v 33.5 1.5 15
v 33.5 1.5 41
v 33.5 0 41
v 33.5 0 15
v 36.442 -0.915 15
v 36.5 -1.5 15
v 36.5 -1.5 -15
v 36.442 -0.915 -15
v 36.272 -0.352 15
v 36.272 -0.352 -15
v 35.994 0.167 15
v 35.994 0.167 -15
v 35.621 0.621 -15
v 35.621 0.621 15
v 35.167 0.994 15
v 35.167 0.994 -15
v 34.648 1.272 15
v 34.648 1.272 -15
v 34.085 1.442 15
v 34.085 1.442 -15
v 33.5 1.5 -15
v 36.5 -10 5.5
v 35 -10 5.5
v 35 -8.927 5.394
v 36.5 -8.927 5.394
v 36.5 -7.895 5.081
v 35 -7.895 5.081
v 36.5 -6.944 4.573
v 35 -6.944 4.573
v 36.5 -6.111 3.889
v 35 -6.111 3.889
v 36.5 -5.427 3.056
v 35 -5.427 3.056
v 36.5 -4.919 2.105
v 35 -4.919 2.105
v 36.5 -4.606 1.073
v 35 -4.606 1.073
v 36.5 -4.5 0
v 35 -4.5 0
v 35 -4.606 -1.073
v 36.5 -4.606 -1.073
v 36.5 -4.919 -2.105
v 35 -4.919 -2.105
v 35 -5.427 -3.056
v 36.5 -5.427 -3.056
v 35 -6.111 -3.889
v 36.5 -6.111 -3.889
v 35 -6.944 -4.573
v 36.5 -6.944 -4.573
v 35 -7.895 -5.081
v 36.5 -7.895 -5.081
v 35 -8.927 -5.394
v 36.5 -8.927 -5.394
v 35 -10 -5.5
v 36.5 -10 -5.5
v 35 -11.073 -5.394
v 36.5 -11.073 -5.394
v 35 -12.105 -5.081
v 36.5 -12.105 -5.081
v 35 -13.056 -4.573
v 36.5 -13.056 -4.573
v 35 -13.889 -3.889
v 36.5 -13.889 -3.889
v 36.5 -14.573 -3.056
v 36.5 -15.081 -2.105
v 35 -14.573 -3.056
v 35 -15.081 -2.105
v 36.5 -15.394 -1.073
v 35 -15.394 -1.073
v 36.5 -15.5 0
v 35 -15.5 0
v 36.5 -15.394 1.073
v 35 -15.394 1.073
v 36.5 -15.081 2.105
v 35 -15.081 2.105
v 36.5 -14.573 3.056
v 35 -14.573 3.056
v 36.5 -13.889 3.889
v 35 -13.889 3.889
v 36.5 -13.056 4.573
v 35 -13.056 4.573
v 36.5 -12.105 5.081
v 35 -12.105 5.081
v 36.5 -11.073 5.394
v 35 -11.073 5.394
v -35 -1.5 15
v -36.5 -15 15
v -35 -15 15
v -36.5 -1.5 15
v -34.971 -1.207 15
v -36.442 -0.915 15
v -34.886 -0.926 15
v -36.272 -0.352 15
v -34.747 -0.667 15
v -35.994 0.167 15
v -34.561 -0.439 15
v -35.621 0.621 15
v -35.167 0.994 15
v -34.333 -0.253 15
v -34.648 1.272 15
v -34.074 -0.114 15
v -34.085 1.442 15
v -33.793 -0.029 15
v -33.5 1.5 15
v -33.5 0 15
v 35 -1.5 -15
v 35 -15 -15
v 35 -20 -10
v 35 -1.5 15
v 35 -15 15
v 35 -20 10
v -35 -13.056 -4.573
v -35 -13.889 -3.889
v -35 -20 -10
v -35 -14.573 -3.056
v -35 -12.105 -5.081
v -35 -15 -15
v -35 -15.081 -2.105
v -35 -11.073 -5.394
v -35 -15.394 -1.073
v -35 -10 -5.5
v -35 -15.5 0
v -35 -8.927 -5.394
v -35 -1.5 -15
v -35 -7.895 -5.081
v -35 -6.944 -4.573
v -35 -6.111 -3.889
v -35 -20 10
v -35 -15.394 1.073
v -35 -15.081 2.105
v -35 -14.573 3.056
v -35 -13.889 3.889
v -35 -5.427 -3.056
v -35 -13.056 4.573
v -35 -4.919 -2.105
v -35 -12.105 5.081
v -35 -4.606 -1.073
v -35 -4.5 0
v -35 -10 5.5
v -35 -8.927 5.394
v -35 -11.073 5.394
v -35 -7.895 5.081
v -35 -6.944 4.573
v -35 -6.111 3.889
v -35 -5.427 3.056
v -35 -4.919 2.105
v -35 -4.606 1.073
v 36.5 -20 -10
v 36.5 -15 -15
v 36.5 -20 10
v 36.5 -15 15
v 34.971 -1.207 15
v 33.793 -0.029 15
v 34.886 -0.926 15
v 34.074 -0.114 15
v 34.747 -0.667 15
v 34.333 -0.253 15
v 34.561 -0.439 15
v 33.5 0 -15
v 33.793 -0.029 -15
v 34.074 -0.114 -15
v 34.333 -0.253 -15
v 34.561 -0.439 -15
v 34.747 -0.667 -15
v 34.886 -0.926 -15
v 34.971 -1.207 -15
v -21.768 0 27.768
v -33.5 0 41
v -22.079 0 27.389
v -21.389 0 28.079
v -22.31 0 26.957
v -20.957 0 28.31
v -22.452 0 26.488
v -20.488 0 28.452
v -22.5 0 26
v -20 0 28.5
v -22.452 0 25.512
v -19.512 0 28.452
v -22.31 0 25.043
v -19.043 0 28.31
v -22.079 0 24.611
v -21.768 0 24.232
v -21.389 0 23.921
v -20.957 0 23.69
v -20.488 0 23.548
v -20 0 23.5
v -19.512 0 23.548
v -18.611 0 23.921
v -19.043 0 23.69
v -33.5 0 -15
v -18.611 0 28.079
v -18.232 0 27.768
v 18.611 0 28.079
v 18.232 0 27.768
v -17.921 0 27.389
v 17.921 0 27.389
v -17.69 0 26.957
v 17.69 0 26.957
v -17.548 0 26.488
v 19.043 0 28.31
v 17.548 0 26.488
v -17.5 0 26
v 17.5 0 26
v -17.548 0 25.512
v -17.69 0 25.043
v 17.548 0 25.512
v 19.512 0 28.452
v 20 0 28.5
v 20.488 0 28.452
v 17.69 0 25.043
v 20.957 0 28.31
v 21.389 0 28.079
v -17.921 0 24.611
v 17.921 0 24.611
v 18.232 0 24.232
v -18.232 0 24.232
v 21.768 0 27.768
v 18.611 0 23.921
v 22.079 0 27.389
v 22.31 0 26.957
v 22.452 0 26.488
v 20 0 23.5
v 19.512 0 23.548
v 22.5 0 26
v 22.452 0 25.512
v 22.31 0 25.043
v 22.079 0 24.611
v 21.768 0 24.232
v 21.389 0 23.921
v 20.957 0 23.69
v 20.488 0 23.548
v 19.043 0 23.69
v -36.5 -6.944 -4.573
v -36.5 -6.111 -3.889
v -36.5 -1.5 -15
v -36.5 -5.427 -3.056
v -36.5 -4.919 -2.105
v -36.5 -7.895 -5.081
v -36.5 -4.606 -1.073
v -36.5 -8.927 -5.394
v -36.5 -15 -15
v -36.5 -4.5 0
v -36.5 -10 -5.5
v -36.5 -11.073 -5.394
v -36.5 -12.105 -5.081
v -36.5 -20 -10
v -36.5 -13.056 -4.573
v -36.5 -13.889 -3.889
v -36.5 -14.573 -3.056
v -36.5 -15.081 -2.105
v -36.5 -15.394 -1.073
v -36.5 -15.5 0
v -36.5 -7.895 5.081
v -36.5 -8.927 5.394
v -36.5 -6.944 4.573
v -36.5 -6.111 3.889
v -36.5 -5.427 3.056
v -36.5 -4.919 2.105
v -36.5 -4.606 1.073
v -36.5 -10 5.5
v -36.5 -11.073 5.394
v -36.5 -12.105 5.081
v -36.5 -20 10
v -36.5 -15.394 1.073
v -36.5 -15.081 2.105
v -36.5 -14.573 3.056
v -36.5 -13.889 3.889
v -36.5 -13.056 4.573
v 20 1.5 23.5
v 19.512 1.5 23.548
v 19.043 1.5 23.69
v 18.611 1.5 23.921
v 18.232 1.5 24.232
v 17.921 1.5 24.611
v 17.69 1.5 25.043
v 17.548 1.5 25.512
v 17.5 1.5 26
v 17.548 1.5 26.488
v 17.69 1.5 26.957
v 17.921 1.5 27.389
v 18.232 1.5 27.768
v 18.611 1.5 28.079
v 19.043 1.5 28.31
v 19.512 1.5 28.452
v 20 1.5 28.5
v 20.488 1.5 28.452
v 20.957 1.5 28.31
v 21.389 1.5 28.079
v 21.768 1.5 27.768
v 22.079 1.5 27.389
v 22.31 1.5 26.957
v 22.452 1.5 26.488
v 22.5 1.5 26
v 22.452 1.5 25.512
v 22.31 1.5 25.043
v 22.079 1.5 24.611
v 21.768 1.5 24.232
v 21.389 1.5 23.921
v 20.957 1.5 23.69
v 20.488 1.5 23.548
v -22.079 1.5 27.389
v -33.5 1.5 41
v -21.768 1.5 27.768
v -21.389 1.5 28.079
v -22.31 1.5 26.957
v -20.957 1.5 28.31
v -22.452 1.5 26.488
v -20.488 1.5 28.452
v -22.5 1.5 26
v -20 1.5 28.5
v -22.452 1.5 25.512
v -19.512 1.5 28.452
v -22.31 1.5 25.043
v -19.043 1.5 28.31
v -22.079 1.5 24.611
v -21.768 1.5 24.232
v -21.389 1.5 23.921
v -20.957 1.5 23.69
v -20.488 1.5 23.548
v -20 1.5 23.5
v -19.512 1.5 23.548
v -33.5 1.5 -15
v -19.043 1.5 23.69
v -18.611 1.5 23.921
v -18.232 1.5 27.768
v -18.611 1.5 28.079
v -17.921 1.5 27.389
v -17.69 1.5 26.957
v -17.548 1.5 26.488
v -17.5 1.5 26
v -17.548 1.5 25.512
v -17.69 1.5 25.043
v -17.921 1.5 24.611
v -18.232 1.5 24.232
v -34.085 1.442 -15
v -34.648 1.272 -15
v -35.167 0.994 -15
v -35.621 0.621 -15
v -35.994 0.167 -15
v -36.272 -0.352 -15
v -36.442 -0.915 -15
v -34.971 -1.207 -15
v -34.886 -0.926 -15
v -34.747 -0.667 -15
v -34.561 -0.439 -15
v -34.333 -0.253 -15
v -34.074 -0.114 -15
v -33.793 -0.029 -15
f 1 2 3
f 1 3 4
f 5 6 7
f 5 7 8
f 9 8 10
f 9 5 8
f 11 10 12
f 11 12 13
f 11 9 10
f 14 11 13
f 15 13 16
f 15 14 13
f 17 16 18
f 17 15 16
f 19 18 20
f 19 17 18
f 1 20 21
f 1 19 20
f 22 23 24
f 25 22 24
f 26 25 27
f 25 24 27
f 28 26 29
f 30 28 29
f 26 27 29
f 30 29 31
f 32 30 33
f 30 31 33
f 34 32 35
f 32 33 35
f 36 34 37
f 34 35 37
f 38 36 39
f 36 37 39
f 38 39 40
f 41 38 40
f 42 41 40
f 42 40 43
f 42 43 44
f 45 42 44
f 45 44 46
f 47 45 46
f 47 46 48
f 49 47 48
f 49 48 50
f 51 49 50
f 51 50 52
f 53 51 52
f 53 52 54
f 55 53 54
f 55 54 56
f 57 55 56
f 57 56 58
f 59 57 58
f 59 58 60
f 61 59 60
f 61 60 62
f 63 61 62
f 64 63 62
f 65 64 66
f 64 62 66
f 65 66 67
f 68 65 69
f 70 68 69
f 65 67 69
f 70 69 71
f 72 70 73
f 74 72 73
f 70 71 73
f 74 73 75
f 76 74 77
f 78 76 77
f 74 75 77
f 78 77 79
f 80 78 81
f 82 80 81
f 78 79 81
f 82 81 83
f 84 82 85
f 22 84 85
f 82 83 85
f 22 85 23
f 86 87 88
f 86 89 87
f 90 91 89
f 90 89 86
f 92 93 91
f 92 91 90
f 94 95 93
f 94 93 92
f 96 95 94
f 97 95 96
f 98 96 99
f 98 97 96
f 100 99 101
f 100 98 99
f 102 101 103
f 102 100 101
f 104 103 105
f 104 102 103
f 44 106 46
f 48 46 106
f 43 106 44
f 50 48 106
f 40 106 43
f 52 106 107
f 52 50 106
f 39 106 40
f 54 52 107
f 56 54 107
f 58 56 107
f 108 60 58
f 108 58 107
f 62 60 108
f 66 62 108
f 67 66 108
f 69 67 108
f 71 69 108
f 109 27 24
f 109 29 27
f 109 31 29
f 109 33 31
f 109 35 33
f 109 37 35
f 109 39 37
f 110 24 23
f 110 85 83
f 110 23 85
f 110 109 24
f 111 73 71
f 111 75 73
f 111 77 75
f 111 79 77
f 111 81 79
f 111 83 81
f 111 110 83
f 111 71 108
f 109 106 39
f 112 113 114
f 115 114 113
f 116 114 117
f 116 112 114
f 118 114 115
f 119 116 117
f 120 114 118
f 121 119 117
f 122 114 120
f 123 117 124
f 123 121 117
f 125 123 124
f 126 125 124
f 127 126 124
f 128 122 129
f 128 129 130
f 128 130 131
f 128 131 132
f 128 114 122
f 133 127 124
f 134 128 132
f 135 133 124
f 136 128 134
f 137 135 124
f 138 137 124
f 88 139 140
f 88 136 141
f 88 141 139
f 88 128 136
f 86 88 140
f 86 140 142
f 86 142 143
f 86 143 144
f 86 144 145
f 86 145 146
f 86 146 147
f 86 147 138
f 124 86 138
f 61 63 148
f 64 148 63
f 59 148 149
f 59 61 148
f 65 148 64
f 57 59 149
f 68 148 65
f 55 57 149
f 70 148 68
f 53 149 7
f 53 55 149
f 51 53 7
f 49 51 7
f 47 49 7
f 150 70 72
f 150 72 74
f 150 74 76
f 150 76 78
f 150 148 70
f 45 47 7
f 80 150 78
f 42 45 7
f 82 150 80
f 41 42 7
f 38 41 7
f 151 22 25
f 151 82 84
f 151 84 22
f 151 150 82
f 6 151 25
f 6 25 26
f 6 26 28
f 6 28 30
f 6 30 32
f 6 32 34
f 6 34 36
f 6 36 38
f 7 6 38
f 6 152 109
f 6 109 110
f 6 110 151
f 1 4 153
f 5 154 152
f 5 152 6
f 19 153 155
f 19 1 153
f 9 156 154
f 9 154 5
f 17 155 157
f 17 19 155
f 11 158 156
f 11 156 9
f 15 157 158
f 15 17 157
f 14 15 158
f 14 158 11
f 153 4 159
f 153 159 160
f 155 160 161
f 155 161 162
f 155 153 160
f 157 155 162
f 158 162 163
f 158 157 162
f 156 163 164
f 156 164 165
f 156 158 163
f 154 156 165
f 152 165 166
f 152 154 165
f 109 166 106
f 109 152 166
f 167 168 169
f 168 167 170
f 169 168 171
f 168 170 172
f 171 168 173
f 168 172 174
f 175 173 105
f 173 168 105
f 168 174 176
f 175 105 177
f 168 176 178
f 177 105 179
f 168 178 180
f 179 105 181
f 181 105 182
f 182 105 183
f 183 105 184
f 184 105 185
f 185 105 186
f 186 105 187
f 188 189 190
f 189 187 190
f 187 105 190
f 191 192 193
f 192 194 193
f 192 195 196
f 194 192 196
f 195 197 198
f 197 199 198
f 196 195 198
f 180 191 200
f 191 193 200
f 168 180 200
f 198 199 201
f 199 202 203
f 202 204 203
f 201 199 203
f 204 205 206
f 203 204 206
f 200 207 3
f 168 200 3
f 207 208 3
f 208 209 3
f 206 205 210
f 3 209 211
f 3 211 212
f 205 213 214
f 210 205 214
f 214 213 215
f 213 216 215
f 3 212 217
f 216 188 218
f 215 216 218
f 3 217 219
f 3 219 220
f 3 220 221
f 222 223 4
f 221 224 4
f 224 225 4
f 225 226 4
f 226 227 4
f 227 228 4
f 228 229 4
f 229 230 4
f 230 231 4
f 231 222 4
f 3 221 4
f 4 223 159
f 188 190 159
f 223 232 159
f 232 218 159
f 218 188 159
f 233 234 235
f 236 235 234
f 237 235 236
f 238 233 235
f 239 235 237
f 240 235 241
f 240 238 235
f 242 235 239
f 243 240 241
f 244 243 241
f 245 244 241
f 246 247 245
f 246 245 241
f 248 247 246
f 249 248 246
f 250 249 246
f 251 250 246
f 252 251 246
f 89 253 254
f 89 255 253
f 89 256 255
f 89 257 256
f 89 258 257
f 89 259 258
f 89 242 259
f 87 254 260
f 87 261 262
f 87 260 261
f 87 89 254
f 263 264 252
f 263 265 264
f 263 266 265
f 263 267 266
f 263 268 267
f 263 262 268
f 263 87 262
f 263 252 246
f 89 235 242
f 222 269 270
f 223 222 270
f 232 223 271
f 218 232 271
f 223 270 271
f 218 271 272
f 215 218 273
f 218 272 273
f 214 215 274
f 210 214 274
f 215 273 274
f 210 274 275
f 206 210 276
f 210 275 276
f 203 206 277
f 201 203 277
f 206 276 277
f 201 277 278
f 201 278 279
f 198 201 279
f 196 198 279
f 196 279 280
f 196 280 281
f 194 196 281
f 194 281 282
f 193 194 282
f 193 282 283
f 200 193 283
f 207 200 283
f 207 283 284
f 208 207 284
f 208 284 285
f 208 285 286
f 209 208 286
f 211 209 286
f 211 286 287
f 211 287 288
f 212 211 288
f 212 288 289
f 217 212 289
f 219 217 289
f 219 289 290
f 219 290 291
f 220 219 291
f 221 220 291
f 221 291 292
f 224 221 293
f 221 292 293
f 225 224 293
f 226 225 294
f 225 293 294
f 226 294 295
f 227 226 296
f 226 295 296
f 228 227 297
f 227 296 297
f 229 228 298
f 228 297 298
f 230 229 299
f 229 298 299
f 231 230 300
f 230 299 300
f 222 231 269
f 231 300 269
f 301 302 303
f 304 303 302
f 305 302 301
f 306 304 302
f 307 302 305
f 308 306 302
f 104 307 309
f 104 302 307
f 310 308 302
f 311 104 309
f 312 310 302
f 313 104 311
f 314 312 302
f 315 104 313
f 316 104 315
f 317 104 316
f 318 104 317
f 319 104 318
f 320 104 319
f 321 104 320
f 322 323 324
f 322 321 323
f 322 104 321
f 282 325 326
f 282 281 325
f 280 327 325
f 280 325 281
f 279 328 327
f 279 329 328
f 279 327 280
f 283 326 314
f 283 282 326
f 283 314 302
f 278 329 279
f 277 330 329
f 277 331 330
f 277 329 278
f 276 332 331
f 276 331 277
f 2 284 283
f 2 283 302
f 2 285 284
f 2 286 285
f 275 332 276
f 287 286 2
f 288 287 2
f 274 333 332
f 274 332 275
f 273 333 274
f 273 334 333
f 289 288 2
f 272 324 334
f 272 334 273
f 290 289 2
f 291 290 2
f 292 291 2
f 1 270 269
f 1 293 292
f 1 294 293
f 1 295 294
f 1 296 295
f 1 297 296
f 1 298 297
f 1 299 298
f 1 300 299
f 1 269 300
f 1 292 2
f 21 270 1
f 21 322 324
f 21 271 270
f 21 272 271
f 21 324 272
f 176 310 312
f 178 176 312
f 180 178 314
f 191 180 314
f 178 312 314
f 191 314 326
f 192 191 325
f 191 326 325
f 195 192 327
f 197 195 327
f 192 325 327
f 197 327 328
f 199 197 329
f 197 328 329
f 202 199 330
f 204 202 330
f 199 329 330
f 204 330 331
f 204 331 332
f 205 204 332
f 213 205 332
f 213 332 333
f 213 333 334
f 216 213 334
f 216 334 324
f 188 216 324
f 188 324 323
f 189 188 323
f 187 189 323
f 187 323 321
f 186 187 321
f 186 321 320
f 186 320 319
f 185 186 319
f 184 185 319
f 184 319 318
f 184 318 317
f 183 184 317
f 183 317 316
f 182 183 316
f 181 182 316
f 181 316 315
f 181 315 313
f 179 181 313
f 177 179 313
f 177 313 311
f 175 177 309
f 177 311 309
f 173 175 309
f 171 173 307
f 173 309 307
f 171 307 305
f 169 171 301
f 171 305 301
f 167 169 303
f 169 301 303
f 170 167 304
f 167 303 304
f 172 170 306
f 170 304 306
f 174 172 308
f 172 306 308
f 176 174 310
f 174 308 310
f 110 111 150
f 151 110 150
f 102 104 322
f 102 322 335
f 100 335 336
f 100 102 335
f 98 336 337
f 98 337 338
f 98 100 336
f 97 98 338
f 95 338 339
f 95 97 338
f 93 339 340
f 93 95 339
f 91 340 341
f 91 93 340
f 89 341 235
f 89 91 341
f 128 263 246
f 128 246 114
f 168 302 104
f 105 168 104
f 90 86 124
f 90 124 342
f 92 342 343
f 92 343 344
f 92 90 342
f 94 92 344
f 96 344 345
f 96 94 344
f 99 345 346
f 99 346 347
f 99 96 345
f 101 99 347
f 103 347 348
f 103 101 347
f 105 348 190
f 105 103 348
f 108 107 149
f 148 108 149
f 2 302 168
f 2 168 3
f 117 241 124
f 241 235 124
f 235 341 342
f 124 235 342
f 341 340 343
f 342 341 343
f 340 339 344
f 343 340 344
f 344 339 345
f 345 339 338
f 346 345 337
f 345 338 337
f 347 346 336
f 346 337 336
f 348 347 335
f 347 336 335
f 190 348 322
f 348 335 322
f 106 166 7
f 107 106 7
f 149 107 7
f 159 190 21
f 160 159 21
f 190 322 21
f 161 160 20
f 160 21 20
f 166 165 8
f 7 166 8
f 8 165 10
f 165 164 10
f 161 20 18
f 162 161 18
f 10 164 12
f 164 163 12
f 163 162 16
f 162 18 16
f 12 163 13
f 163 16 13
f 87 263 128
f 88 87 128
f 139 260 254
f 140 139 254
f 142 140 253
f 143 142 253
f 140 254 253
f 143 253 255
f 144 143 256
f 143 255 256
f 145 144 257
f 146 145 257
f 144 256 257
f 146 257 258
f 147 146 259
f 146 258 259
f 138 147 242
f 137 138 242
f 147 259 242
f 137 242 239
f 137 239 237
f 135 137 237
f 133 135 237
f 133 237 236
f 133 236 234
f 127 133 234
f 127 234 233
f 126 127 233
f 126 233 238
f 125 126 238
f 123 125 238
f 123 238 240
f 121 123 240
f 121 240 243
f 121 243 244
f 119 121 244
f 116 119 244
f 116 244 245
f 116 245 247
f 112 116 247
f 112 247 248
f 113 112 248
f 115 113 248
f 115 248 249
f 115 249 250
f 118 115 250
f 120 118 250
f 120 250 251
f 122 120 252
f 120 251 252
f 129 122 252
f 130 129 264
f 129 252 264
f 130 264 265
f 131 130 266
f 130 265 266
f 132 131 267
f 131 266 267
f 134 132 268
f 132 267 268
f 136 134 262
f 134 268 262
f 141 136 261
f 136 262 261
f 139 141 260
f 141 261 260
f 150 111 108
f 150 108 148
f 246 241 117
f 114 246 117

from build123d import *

# Parameters (mm, degrees)
SM_BASE_FLANGE_1_DEPTH   = 15
OTHER_START              = -24.748737342
OTHER_1_OUTLINE_W        = 1.5
OTHER_1_OUTLINE_H        = 23.213203436
OTHER_1_DEPTH            = 3.535533906
OTHER_START_2            = -7.071067812
OTHER_1_2_OUTLINE_W      = 1.5
OTHER_1_2_OUTLINE_H      = 3.786796564
OTHER_1_2_DEPTH          = 7.071067812
SKETCH_6_R               = 5.5
CUT_EXTRUDE_734_DEPTH    = 78.162166896
SKETCH_8_W               = 67
SKETCH_8_H               = 26
SM_BASE_FLANGE_1_2_DEPTH = 1.5
SKETCH_7_R               = 2.5
CUT_EXTRUDE_2_DEPTH      = 10


# Read off the part's stored shape, not the designer's step: Затупленный угол1
# Sheet-metal steps are written as plain solids
with BuildPart() as part:
    # Sketch 1 → Sm Base Flange 1 (new, symmetric)
    with BuildSketch(Plane.XY):
        with BuildLine():
            Line((-35, -20), (-35, -1.5))
            ThreePointArc((-35, -1.5), (-34.560660172, -0.439339828), (-33.5, 0))
            Line((-33.5, 0), (33.5, 0))
            ThreePointArc((33.5, 0), (34.560660172, -0.439339828), (35, -1.5))
            Line((35, -1.5), (35, -20))
            Line((35, -20), (36.5, -20))
            Line((36.5, -20), (36.5, -1.5))
            ThreePointArc((36.5, -1.5), (35.621320344, 0.621320344), (33.5, 1.5))
            Line((33.5, 1.5), (-33.5, 1.5))
            ThreePointArc((-33.5, 1.5), (-35.621320344, 0.621320344), (-36.5, -1.5))
            Line((-36.5, -1.5), (-36.5, -20))
            Line((-36.5, -20), (-35, -20))
        make_face()
    extrude(amount=SM_BASE_FLANGE_1_DEPTH, both=True)

    # Other 1 outline → Other 1 (cut)
    with BuildSketch(Plane(origin=(0, 0, 0), x_dir=(1, 0, 0), z_dir=(0, 0.707106781186548, -0.707106781186547)).offset(OTHER_START)):
        with Locations((-35.75, 9.606601718)):
            Rectangle(OTHER_1_OUTLINE_W, OTHER_1_OUTLINE_H)
        with Locations((35.75, 9.606601718)):
            Rectangle(OTHER_1_OUTLINE_W, OTHER_1_OUTLINE_H)
    extrude(amount=OTHER_1_DEPTH, mode=Mode.SUBTRACT)

    # Other 1 2 outline → Other 1 2 (cut)
    with BuildSketch(Plane(origin=(0, 0, 0), x_dir=(1, 0, 0), z_dir=(0, 0.707106781186548, -0.707106781186547)).offset(OTHER_START_2)):
        with Locations((-35.75, 23.106601718)):
            Rectangle(OTHER_1_2_OUTLINE_W, OTHER_1_2_OUTLINE_H)
        with Locations((35.75, 23.106601718)):
            Rectangle(OTHER_1_2_OUTLINE_W, OTHER_1_2_OUTLINE_H)
    extrude(amount=OTHER_1_2_DEPTH, mode=Mode.SUBTRACT)

    # Эскиз6 → Cut-Extrude 734 (cut, through all)
    with BuildSketch(Plane.ZY.offset(36.5)):
        with Locations((0, -10)):
            Circle(SKETCH_6_R)
    extrude(amount=-CUT_EXTRUDE_734_DEPTH, mode=Mode.SUBTRACT)

    # Эскиз8 → Sm Base Flange 1 2 (add)
    with BuildSketch(Plane(origin=(0, 1.5, 0), x_dir=(1, 0, 0), z_dir=(0, 1, 0))):
        with Locations((0, -28)):
            Rectangle(SKETCH_8_W, SKETCH_8_H)
    extrude(amount=-SM_BASE_FLANGE_1_2_DEPTH)

    # Эскиз7 → Вырез-Вытянуть2 (cut)
    with BuildSketch(Plane(origin=(0, 1.5, 0), x_dir=(1, 0, 0), z_dir=(0, 1, 0))):
        with Locations(Location((-20, -26, 0), (0, 0, 270))):
            Circle(SKETCH_7_R)
        with Locations(Location((20, -26, 0), (0, 0, 90))):
            Circle(SKETCH_7_R)
    extrude(amount=-CUT_EXTRUDE_2_DEPTH, mode=Mode.SUBTRACT)


solid = part.part
